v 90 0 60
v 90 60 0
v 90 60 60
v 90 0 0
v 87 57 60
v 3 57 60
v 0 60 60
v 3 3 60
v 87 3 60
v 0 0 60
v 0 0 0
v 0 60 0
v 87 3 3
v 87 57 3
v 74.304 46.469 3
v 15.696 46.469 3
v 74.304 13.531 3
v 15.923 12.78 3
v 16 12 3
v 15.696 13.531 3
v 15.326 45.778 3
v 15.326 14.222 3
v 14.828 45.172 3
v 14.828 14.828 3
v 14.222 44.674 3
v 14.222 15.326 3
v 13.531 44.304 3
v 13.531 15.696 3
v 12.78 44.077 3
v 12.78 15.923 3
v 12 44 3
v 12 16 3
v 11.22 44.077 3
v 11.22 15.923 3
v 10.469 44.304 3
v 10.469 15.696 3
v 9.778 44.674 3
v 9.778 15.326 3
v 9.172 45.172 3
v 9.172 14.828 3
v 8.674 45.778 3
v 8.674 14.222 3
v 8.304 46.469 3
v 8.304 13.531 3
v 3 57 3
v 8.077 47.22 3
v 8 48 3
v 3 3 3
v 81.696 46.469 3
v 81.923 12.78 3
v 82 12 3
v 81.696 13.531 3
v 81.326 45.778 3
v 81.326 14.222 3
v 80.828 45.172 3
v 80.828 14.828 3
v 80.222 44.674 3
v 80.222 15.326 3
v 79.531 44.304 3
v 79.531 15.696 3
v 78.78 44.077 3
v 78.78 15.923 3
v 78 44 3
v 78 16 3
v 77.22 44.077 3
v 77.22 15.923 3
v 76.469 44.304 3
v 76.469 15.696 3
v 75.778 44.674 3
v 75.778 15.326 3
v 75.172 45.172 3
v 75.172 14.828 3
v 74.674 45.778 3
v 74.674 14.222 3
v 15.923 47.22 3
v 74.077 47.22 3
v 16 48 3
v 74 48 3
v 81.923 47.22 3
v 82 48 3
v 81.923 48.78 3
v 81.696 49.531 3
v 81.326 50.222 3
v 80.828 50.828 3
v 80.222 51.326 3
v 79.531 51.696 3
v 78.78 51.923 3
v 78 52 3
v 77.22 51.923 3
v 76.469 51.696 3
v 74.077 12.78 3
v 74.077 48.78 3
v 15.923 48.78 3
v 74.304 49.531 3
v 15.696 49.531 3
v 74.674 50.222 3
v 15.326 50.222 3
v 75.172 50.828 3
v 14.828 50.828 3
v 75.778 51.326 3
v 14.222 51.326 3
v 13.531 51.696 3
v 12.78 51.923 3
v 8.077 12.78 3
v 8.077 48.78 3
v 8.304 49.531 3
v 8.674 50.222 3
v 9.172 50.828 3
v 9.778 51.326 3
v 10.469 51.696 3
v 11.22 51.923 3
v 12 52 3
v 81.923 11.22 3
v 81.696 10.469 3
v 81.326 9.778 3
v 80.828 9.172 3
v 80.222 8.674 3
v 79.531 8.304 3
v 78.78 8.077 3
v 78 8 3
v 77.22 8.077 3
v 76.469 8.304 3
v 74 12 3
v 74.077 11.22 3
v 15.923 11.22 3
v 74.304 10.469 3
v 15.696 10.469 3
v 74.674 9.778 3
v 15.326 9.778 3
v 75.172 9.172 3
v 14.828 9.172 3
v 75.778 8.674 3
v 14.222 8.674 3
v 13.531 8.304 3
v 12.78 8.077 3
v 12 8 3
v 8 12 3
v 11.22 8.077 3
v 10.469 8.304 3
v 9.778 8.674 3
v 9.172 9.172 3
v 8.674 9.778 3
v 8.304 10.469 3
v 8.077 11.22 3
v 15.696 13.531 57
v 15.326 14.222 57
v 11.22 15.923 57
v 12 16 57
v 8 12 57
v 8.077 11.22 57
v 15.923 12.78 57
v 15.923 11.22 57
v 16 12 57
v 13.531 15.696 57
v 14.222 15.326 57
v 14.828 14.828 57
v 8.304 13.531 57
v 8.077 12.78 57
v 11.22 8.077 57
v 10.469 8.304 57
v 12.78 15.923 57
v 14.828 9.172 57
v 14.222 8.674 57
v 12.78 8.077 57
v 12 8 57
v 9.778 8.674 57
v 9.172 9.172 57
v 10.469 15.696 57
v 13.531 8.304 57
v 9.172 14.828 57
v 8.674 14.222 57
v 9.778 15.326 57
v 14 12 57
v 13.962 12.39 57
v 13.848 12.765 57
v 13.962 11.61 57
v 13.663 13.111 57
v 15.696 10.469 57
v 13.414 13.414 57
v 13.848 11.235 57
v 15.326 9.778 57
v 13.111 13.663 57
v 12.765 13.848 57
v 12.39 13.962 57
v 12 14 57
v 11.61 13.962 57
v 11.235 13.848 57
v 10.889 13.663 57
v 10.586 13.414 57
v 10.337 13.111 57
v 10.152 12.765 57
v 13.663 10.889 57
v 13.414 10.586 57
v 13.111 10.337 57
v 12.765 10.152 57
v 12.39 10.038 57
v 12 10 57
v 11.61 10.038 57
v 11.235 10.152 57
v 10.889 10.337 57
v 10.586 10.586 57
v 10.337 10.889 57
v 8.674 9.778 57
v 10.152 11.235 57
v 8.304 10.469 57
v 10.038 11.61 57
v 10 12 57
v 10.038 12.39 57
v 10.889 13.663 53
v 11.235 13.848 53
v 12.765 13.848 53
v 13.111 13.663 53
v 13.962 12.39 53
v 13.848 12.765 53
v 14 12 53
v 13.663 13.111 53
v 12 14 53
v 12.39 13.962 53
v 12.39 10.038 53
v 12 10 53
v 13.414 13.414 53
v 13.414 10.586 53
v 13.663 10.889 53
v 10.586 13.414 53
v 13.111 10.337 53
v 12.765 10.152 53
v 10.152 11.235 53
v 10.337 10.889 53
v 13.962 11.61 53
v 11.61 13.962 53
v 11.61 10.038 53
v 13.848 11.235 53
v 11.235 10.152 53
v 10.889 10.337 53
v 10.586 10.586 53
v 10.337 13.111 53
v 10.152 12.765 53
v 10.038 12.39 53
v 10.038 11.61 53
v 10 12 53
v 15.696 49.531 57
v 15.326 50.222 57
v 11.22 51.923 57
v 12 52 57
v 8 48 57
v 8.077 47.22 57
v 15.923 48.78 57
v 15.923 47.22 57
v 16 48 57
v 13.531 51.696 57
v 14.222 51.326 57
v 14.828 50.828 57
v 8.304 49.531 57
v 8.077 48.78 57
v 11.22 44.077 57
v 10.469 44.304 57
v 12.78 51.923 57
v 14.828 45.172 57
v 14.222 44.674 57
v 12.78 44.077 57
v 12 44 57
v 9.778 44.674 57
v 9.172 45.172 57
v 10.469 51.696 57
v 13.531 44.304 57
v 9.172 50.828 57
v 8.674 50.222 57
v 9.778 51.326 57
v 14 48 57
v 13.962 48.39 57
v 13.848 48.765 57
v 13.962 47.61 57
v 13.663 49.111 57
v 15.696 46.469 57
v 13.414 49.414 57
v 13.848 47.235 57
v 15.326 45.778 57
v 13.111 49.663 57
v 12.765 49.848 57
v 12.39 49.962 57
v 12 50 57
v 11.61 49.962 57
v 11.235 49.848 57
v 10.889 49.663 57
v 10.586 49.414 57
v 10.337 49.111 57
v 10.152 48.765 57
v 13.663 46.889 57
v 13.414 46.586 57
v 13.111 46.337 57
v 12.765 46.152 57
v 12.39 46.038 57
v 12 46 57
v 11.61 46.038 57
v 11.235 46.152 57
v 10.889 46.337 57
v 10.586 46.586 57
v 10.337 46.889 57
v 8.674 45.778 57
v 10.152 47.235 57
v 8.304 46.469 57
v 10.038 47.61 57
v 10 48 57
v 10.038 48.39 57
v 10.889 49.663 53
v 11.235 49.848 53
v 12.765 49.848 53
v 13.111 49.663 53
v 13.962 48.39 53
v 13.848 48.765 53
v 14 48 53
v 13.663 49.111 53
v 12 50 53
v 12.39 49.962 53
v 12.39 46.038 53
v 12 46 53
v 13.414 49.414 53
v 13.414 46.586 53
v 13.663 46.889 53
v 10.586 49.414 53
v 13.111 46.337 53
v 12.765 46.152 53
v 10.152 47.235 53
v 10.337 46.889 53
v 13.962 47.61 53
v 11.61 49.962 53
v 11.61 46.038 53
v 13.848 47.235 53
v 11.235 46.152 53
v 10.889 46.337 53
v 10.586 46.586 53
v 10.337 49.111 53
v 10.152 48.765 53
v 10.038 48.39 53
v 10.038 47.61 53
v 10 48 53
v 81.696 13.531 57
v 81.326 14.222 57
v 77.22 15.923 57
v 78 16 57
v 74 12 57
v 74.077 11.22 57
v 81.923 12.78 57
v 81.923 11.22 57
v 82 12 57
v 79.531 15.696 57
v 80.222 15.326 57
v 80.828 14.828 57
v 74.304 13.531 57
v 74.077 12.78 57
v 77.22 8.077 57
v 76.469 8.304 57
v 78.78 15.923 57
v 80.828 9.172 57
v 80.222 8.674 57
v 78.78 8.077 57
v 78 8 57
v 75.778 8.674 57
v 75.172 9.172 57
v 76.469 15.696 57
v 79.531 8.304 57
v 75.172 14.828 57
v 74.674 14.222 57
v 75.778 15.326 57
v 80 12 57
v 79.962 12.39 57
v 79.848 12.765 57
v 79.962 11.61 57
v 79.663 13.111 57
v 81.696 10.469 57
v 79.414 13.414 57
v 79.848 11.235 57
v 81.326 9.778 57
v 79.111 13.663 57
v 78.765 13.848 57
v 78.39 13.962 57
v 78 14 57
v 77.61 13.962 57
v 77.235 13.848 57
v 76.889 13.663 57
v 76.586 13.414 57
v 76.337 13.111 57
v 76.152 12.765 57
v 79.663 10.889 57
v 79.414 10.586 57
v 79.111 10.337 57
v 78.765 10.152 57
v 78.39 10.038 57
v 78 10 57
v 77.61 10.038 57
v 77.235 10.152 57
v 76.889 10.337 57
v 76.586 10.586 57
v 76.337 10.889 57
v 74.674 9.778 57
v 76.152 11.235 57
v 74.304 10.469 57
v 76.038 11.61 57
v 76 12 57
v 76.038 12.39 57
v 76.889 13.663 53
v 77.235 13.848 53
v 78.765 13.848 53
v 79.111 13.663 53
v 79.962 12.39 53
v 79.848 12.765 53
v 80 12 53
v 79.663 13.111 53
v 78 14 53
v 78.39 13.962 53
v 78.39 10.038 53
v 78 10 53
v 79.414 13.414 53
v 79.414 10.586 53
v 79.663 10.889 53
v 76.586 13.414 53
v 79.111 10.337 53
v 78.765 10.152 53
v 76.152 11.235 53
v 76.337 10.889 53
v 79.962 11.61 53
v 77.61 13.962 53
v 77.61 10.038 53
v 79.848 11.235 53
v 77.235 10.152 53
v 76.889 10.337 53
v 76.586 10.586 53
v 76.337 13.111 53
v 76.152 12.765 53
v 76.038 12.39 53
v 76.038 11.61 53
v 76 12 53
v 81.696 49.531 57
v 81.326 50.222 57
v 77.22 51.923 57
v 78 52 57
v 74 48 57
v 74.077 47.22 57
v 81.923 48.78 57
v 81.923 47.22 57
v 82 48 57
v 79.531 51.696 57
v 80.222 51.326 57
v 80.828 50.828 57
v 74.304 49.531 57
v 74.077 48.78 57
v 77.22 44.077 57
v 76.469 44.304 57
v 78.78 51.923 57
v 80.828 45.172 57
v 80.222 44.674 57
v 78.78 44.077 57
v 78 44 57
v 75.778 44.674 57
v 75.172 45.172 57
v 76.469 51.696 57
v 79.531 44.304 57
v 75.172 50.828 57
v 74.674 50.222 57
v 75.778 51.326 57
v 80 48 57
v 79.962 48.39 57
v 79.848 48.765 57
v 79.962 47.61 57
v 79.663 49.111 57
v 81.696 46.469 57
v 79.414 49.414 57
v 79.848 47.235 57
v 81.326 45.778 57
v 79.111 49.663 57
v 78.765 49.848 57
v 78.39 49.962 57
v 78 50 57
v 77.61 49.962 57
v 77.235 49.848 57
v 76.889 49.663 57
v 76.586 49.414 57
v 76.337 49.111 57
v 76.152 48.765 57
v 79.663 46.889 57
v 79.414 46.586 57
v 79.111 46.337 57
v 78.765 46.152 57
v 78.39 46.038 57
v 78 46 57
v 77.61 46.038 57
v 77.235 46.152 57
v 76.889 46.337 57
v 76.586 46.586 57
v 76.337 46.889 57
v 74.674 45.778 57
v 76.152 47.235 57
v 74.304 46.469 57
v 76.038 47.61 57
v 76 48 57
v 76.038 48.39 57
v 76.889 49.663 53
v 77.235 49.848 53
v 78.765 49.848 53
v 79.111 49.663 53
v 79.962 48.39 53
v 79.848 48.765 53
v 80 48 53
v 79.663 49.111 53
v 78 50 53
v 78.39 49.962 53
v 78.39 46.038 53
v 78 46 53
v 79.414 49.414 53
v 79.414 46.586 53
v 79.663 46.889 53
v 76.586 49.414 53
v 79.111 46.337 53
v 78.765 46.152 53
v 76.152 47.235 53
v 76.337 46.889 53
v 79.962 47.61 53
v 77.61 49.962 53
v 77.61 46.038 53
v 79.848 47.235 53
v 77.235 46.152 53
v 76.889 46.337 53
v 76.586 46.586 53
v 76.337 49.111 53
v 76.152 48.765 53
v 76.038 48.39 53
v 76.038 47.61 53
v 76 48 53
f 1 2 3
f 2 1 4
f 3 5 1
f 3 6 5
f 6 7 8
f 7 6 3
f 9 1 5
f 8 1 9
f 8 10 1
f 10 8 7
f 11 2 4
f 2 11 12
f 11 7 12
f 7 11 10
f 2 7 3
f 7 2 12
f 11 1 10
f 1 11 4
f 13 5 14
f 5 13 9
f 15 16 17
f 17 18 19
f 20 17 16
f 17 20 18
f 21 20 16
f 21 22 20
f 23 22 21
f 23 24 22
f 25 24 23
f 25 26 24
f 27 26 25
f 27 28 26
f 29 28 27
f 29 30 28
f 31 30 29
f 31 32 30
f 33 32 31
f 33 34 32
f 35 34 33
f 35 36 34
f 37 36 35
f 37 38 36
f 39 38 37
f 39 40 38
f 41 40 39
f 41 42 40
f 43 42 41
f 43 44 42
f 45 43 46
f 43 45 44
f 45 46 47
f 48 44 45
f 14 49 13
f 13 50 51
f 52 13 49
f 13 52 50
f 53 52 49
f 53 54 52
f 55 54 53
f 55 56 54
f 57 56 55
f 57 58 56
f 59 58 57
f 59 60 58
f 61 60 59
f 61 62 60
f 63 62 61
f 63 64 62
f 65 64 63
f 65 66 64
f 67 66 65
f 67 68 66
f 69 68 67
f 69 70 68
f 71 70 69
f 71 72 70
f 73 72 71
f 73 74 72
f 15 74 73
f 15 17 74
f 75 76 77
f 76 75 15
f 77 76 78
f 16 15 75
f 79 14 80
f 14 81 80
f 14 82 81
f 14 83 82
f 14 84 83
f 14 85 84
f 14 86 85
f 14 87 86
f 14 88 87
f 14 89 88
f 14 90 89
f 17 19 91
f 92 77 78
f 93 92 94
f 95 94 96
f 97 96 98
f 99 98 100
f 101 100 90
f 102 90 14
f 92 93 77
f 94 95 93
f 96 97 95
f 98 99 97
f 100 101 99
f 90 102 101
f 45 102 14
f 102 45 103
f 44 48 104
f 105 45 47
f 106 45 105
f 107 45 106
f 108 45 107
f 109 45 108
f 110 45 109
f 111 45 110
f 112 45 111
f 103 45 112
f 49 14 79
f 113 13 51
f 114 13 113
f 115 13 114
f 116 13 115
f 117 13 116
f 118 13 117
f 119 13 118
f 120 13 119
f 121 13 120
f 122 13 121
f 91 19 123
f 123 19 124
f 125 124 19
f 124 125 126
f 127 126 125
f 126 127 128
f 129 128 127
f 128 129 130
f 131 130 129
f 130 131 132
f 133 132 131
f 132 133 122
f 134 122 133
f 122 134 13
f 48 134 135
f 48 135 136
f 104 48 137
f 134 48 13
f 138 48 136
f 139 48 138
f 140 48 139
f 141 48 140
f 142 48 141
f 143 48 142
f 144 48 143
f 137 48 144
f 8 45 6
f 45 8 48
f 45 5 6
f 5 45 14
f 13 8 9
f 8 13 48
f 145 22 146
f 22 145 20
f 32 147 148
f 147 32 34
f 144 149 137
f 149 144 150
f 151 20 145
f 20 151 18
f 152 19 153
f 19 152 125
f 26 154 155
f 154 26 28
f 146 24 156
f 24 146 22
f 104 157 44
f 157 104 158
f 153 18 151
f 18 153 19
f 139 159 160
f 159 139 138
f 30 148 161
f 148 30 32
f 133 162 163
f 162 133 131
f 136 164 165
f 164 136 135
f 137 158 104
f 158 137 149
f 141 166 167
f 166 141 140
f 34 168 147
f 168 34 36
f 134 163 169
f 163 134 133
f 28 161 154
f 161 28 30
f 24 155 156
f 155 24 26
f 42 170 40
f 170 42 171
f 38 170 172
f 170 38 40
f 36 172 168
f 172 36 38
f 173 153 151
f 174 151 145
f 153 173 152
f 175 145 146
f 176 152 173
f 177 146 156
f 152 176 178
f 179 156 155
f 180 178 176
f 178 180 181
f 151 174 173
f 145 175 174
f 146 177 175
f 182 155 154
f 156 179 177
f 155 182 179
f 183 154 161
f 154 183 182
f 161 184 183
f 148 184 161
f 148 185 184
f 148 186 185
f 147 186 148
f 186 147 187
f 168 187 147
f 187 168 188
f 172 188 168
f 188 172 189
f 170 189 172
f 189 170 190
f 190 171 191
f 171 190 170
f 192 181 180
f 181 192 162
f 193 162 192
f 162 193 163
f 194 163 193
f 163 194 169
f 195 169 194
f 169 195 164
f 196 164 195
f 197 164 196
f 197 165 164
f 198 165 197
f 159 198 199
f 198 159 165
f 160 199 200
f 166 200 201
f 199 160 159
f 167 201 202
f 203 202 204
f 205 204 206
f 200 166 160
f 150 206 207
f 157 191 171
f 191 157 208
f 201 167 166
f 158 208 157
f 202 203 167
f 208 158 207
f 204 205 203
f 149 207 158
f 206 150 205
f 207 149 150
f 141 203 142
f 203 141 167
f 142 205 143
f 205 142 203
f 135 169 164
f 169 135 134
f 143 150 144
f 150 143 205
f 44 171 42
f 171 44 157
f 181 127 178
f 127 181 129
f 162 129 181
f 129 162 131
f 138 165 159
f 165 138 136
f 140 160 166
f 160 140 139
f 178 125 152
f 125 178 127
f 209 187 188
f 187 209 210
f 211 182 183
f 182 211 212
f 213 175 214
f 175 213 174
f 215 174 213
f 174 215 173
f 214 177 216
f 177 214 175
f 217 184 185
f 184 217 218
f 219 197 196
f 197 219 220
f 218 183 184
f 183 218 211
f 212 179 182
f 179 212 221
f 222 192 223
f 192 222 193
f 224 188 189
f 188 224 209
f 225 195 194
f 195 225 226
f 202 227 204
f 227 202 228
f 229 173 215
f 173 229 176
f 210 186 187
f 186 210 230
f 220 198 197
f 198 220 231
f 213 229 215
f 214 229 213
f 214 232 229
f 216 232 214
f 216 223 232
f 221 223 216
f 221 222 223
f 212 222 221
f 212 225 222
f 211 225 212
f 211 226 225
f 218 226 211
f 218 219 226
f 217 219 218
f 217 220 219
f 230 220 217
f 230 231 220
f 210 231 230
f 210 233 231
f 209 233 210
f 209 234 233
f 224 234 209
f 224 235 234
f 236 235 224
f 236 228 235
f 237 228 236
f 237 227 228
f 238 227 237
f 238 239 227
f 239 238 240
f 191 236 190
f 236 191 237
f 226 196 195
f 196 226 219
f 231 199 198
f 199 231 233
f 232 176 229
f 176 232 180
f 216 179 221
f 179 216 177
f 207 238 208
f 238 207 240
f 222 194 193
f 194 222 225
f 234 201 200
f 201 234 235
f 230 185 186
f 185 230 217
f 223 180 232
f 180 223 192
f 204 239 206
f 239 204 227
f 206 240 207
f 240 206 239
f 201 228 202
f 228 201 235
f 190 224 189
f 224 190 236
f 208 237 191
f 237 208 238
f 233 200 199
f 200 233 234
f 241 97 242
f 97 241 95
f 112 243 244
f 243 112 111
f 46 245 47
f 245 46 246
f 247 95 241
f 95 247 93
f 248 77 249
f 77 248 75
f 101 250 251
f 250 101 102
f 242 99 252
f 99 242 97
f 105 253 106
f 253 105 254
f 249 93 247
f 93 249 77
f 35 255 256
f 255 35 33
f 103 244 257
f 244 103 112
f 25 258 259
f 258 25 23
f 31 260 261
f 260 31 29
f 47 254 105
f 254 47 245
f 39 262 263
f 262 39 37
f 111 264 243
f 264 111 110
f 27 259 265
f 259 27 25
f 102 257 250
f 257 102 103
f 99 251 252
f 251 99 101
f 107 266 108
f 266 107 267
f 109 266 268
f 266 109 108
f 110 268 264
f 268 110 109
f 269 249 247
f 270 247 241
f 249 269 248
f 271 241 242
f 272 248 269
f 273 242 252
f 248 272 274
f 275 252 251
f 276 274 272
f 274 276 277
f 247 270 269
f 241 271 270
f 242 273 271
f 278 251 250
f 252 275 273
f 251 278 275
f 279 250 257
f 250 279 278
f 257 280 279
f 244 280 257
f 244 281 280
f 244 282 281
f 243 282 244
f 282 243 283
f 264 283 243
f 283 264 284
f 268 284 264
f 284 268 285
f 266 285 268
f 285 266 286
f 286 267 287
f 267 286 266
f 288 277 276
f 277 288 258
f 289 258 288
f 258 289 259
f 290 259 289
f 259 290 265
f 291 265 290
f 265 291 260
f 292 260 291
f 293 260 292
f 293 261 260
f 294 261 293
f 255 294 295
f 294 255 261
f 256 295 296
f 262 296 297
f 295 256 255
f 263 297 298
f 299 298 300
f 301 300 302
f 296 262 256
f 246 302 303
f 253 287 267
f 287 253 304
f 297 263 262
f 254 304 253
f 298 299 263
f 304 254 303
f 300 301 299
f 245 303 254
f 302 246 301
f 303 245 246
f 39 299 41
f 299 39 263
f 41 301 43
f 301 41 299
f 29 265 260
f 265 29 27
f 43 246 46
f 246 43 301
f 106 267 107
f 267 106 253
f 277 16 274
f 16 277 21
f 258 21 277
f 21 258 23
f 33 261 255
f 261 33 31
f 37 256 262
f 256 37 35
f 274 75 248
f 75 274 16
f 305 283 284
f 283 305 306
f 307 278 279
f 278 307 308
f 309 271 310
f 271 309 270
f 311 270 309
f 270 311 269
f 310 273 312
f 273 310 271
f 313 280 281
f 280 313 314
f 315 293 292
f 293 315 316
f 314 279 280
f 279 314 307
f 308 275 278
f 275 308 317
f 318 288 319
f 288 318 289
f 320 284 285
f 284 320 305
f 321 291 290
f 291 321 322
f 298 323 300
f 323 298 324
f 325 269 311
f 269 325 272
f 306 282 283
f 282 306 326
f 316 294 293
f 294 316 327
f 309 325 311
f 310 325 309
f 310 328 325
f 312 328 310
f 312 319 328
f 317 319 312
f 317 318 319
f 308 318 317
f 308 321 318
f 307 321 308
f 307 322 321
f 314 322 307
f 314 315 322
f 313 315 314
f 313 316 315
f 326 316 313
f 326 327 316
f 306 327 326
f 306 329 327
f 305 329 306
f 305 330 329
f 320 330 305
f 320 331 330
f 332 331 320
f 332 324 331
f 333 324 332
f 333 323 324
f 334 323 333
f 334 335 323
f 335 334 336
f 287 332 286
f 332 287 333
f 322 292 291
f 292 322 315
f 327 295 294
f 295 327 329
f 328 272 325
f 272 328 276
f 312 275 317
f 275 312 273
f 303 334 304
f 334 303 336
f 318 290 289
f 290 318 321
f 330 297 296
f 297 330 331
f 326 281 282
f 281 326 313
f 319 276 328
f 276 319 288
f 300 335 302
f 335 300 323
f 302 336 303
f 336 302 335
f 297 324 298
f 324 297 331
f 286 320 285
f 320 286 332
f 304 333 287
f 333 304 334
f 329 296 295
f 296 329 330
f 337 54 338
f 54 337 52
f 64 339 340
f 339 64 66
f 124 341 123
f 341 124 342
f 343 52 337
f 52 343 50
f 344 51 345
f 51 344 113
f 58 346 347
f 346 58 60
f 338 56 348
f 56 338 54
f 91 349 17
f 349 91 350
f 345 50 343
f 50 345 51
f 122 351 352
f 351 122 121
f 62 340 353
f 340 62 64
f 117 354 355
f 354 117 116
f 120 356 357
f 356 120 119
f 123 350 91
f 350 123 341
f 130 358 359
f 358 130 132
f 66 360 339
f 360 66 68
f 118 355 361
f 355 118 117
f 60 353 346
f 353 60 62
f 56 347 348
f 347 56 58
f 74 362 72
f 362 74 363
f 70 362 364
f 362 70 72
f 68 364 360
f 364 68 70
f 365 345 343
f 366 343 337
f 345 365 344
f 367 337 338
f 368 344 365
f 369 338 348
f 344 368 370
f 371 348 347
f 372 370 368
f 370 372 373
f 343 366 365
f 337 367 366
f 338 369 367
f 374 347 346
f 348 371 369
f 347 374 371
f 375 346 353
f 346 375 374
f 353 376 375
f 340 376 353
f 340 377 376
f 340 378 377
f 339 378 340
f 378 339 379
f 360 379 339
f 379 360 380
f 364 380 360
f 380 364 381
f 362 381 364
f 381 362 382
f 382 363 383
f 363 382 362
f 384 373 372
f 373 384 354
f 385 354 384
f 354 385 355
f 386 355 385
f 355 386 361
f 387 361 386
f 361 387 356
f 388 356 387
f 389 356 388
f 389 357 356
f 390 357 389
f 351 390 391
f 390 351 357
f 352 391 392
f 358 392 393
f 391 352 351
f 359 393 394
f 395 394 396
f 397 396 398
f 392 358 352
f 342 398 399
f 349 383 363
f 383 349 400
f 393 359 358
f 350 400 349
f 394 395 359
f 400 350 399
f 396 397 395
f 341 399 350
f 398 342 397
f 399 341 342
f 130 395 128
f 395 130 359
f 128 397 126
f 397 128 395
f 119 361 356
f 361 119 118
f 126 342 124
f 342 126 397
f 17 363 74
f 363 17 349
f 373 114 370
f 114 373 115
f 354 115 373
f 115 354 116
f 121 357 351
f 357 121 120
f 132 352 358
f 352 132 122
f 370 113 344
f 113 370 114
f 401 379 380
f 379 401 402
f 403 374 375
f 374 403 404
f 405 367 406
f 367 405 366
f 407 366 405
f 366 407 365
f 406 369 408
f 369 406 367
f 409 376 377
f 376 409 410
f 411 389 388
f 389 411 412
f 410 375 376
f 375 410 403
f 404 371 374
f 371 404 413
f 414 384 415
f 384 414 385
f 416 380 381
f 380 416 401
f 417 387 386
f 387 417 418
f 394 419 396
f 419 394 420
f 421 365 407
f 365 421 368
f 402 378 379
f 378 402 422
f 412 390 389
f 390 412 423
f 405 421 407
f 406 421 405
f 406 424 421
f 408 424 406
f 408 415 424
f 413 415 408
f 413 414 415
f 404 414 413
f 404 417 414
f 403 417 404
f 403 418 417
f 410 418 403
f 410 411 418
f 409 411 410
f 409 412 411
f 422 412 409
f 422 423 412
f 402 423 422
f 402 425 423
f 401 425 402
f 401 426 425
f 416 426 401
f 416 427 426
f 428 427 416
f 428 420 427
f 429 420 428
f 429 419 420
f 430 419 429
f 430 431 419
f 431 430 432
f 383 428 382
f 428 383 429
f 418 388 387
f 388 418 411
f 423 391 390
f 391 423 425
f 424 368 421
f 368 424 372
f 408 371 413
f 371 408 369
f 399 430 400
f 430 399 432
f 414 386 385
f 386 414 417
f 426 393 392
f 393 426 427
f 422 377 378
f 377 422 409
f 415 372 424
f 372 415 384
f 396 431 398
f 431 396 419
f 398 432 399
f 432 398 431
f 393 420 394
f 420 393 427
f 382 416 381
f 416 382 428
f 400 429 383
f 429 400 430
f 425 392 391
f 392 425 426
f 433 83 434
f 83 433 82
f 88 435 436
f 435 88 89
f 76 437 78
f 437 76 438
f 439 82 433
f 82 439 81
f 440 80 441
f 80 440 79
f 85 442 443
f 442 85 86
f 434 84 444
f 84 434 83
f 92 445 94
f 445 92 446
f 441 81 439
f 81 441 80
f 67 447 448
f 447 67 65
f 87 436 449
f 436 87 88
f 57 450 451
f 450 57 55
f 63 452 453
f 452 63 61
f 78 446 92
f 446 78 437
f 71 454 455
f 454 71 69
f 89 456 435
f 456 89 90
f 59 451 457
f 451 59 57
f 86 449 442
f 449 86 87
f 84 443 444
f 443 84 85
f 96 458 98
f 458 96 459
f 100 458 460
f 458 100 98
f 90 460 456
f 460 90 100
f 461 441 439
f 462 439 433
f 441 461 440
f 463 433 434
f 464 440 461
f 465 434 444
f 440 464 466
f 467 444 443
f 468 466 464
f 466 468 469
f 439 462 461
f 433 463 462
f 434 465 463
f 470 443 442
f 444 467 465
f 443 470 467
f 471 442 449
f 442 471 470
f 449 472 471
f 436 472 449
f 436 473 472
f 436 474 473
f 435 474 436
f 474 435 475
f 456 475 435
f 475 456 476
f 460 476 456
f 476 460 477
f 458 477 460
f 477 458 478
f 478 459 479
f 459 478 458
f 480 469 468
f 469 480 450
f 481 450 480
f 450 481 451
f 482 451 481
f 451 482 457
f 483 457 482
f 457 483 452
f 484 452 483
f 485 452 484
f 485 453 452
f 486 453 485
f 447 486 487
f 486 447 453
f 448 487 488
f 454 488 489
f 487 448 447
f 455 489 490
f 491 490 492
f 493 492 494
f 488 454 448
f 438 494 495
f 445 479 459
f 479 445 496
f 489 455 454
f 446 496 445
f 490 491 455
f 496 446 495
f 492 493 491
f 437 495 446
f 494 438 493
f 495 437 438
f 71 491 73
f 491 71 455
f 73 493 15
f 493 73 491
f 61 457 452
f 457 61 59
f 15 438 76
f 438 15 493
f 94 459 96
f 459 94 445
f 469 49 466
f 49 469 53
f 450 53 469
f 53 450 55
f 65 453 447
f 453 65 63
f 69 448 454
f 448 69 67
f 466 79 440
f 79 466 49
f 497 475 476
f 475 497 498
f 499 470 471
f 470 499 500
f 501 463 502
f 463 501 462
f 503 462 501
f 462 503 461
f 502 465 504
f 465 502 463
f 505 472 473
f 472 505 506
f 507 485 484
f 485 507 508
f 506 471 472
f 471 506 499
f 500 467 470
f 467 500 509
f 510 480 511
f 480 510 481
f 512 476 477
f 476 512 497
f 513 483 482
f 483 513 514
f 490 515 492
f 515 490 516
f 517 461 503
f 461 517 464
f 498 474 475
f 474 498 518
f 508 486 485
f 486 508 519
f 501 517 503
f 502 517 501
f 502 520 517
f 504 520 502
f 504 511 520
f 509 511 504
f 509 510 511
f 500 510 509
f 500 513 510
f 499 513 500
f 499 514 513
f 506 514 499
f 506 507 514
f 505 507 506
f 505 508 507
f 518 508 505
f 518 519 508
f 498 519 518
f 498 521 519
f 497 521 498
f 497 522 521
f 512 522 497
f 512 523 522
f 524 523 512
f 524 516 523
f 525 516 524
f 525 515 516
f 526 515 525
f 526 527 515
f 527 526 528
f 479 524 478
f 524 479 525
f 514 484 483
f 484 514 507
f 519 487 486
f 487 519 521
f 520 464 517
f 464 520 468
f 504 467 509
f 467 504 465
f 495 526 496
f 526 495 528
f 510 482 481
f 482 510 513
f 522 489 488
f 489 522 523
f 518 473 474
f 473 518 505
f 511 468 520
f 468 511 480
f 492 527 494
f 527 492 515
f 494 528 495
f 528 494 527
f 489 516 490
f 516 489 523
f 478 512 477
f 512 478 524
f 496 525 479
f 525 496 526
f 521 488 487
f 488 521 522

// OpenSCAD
$fn = 32;

// ----------------------------------------------------------------------
// Enclosure box: bosses enclosure
// ----------------------------------------------------------------------

// --- parameters (mm) ---
box_l = 90;               // outer length, X
box_w = 60;               // outer width, Y
box_h = 60;               // outer height
wall_t = 3;               // wall thickness
boss_r = 4;               // corner boss radius
hole_r = 2;               // boss screw hole radius
boss_in = 12;             // boss inset from the corners

inner_h = box_h - wall_t;  // cavity depth
boss_h = inner_h - 2;  // corner boss height

difference() {
  union() {
    difference() {
      cube([box_l, box_w, box_h]);
      translate([wall_t, wall_t, wall_t])
        cube([box_l - 2 * wall_t, box_w - 2 * wall_t, box_h]);
    }
    for (sx = [0, 1], sy = [0, 1])
      translate([sx ? box_l - boss_in : boss_in,
                 sy ? box_w - boss_in : boss_in, wall_t - 1])
        difference() {
          cylinder(r = boss_r, h = boss_h);
          translate([0, 0, boss_h - 4])
            cylinder(r = hole_r, h = 5);
        }
  }
}
